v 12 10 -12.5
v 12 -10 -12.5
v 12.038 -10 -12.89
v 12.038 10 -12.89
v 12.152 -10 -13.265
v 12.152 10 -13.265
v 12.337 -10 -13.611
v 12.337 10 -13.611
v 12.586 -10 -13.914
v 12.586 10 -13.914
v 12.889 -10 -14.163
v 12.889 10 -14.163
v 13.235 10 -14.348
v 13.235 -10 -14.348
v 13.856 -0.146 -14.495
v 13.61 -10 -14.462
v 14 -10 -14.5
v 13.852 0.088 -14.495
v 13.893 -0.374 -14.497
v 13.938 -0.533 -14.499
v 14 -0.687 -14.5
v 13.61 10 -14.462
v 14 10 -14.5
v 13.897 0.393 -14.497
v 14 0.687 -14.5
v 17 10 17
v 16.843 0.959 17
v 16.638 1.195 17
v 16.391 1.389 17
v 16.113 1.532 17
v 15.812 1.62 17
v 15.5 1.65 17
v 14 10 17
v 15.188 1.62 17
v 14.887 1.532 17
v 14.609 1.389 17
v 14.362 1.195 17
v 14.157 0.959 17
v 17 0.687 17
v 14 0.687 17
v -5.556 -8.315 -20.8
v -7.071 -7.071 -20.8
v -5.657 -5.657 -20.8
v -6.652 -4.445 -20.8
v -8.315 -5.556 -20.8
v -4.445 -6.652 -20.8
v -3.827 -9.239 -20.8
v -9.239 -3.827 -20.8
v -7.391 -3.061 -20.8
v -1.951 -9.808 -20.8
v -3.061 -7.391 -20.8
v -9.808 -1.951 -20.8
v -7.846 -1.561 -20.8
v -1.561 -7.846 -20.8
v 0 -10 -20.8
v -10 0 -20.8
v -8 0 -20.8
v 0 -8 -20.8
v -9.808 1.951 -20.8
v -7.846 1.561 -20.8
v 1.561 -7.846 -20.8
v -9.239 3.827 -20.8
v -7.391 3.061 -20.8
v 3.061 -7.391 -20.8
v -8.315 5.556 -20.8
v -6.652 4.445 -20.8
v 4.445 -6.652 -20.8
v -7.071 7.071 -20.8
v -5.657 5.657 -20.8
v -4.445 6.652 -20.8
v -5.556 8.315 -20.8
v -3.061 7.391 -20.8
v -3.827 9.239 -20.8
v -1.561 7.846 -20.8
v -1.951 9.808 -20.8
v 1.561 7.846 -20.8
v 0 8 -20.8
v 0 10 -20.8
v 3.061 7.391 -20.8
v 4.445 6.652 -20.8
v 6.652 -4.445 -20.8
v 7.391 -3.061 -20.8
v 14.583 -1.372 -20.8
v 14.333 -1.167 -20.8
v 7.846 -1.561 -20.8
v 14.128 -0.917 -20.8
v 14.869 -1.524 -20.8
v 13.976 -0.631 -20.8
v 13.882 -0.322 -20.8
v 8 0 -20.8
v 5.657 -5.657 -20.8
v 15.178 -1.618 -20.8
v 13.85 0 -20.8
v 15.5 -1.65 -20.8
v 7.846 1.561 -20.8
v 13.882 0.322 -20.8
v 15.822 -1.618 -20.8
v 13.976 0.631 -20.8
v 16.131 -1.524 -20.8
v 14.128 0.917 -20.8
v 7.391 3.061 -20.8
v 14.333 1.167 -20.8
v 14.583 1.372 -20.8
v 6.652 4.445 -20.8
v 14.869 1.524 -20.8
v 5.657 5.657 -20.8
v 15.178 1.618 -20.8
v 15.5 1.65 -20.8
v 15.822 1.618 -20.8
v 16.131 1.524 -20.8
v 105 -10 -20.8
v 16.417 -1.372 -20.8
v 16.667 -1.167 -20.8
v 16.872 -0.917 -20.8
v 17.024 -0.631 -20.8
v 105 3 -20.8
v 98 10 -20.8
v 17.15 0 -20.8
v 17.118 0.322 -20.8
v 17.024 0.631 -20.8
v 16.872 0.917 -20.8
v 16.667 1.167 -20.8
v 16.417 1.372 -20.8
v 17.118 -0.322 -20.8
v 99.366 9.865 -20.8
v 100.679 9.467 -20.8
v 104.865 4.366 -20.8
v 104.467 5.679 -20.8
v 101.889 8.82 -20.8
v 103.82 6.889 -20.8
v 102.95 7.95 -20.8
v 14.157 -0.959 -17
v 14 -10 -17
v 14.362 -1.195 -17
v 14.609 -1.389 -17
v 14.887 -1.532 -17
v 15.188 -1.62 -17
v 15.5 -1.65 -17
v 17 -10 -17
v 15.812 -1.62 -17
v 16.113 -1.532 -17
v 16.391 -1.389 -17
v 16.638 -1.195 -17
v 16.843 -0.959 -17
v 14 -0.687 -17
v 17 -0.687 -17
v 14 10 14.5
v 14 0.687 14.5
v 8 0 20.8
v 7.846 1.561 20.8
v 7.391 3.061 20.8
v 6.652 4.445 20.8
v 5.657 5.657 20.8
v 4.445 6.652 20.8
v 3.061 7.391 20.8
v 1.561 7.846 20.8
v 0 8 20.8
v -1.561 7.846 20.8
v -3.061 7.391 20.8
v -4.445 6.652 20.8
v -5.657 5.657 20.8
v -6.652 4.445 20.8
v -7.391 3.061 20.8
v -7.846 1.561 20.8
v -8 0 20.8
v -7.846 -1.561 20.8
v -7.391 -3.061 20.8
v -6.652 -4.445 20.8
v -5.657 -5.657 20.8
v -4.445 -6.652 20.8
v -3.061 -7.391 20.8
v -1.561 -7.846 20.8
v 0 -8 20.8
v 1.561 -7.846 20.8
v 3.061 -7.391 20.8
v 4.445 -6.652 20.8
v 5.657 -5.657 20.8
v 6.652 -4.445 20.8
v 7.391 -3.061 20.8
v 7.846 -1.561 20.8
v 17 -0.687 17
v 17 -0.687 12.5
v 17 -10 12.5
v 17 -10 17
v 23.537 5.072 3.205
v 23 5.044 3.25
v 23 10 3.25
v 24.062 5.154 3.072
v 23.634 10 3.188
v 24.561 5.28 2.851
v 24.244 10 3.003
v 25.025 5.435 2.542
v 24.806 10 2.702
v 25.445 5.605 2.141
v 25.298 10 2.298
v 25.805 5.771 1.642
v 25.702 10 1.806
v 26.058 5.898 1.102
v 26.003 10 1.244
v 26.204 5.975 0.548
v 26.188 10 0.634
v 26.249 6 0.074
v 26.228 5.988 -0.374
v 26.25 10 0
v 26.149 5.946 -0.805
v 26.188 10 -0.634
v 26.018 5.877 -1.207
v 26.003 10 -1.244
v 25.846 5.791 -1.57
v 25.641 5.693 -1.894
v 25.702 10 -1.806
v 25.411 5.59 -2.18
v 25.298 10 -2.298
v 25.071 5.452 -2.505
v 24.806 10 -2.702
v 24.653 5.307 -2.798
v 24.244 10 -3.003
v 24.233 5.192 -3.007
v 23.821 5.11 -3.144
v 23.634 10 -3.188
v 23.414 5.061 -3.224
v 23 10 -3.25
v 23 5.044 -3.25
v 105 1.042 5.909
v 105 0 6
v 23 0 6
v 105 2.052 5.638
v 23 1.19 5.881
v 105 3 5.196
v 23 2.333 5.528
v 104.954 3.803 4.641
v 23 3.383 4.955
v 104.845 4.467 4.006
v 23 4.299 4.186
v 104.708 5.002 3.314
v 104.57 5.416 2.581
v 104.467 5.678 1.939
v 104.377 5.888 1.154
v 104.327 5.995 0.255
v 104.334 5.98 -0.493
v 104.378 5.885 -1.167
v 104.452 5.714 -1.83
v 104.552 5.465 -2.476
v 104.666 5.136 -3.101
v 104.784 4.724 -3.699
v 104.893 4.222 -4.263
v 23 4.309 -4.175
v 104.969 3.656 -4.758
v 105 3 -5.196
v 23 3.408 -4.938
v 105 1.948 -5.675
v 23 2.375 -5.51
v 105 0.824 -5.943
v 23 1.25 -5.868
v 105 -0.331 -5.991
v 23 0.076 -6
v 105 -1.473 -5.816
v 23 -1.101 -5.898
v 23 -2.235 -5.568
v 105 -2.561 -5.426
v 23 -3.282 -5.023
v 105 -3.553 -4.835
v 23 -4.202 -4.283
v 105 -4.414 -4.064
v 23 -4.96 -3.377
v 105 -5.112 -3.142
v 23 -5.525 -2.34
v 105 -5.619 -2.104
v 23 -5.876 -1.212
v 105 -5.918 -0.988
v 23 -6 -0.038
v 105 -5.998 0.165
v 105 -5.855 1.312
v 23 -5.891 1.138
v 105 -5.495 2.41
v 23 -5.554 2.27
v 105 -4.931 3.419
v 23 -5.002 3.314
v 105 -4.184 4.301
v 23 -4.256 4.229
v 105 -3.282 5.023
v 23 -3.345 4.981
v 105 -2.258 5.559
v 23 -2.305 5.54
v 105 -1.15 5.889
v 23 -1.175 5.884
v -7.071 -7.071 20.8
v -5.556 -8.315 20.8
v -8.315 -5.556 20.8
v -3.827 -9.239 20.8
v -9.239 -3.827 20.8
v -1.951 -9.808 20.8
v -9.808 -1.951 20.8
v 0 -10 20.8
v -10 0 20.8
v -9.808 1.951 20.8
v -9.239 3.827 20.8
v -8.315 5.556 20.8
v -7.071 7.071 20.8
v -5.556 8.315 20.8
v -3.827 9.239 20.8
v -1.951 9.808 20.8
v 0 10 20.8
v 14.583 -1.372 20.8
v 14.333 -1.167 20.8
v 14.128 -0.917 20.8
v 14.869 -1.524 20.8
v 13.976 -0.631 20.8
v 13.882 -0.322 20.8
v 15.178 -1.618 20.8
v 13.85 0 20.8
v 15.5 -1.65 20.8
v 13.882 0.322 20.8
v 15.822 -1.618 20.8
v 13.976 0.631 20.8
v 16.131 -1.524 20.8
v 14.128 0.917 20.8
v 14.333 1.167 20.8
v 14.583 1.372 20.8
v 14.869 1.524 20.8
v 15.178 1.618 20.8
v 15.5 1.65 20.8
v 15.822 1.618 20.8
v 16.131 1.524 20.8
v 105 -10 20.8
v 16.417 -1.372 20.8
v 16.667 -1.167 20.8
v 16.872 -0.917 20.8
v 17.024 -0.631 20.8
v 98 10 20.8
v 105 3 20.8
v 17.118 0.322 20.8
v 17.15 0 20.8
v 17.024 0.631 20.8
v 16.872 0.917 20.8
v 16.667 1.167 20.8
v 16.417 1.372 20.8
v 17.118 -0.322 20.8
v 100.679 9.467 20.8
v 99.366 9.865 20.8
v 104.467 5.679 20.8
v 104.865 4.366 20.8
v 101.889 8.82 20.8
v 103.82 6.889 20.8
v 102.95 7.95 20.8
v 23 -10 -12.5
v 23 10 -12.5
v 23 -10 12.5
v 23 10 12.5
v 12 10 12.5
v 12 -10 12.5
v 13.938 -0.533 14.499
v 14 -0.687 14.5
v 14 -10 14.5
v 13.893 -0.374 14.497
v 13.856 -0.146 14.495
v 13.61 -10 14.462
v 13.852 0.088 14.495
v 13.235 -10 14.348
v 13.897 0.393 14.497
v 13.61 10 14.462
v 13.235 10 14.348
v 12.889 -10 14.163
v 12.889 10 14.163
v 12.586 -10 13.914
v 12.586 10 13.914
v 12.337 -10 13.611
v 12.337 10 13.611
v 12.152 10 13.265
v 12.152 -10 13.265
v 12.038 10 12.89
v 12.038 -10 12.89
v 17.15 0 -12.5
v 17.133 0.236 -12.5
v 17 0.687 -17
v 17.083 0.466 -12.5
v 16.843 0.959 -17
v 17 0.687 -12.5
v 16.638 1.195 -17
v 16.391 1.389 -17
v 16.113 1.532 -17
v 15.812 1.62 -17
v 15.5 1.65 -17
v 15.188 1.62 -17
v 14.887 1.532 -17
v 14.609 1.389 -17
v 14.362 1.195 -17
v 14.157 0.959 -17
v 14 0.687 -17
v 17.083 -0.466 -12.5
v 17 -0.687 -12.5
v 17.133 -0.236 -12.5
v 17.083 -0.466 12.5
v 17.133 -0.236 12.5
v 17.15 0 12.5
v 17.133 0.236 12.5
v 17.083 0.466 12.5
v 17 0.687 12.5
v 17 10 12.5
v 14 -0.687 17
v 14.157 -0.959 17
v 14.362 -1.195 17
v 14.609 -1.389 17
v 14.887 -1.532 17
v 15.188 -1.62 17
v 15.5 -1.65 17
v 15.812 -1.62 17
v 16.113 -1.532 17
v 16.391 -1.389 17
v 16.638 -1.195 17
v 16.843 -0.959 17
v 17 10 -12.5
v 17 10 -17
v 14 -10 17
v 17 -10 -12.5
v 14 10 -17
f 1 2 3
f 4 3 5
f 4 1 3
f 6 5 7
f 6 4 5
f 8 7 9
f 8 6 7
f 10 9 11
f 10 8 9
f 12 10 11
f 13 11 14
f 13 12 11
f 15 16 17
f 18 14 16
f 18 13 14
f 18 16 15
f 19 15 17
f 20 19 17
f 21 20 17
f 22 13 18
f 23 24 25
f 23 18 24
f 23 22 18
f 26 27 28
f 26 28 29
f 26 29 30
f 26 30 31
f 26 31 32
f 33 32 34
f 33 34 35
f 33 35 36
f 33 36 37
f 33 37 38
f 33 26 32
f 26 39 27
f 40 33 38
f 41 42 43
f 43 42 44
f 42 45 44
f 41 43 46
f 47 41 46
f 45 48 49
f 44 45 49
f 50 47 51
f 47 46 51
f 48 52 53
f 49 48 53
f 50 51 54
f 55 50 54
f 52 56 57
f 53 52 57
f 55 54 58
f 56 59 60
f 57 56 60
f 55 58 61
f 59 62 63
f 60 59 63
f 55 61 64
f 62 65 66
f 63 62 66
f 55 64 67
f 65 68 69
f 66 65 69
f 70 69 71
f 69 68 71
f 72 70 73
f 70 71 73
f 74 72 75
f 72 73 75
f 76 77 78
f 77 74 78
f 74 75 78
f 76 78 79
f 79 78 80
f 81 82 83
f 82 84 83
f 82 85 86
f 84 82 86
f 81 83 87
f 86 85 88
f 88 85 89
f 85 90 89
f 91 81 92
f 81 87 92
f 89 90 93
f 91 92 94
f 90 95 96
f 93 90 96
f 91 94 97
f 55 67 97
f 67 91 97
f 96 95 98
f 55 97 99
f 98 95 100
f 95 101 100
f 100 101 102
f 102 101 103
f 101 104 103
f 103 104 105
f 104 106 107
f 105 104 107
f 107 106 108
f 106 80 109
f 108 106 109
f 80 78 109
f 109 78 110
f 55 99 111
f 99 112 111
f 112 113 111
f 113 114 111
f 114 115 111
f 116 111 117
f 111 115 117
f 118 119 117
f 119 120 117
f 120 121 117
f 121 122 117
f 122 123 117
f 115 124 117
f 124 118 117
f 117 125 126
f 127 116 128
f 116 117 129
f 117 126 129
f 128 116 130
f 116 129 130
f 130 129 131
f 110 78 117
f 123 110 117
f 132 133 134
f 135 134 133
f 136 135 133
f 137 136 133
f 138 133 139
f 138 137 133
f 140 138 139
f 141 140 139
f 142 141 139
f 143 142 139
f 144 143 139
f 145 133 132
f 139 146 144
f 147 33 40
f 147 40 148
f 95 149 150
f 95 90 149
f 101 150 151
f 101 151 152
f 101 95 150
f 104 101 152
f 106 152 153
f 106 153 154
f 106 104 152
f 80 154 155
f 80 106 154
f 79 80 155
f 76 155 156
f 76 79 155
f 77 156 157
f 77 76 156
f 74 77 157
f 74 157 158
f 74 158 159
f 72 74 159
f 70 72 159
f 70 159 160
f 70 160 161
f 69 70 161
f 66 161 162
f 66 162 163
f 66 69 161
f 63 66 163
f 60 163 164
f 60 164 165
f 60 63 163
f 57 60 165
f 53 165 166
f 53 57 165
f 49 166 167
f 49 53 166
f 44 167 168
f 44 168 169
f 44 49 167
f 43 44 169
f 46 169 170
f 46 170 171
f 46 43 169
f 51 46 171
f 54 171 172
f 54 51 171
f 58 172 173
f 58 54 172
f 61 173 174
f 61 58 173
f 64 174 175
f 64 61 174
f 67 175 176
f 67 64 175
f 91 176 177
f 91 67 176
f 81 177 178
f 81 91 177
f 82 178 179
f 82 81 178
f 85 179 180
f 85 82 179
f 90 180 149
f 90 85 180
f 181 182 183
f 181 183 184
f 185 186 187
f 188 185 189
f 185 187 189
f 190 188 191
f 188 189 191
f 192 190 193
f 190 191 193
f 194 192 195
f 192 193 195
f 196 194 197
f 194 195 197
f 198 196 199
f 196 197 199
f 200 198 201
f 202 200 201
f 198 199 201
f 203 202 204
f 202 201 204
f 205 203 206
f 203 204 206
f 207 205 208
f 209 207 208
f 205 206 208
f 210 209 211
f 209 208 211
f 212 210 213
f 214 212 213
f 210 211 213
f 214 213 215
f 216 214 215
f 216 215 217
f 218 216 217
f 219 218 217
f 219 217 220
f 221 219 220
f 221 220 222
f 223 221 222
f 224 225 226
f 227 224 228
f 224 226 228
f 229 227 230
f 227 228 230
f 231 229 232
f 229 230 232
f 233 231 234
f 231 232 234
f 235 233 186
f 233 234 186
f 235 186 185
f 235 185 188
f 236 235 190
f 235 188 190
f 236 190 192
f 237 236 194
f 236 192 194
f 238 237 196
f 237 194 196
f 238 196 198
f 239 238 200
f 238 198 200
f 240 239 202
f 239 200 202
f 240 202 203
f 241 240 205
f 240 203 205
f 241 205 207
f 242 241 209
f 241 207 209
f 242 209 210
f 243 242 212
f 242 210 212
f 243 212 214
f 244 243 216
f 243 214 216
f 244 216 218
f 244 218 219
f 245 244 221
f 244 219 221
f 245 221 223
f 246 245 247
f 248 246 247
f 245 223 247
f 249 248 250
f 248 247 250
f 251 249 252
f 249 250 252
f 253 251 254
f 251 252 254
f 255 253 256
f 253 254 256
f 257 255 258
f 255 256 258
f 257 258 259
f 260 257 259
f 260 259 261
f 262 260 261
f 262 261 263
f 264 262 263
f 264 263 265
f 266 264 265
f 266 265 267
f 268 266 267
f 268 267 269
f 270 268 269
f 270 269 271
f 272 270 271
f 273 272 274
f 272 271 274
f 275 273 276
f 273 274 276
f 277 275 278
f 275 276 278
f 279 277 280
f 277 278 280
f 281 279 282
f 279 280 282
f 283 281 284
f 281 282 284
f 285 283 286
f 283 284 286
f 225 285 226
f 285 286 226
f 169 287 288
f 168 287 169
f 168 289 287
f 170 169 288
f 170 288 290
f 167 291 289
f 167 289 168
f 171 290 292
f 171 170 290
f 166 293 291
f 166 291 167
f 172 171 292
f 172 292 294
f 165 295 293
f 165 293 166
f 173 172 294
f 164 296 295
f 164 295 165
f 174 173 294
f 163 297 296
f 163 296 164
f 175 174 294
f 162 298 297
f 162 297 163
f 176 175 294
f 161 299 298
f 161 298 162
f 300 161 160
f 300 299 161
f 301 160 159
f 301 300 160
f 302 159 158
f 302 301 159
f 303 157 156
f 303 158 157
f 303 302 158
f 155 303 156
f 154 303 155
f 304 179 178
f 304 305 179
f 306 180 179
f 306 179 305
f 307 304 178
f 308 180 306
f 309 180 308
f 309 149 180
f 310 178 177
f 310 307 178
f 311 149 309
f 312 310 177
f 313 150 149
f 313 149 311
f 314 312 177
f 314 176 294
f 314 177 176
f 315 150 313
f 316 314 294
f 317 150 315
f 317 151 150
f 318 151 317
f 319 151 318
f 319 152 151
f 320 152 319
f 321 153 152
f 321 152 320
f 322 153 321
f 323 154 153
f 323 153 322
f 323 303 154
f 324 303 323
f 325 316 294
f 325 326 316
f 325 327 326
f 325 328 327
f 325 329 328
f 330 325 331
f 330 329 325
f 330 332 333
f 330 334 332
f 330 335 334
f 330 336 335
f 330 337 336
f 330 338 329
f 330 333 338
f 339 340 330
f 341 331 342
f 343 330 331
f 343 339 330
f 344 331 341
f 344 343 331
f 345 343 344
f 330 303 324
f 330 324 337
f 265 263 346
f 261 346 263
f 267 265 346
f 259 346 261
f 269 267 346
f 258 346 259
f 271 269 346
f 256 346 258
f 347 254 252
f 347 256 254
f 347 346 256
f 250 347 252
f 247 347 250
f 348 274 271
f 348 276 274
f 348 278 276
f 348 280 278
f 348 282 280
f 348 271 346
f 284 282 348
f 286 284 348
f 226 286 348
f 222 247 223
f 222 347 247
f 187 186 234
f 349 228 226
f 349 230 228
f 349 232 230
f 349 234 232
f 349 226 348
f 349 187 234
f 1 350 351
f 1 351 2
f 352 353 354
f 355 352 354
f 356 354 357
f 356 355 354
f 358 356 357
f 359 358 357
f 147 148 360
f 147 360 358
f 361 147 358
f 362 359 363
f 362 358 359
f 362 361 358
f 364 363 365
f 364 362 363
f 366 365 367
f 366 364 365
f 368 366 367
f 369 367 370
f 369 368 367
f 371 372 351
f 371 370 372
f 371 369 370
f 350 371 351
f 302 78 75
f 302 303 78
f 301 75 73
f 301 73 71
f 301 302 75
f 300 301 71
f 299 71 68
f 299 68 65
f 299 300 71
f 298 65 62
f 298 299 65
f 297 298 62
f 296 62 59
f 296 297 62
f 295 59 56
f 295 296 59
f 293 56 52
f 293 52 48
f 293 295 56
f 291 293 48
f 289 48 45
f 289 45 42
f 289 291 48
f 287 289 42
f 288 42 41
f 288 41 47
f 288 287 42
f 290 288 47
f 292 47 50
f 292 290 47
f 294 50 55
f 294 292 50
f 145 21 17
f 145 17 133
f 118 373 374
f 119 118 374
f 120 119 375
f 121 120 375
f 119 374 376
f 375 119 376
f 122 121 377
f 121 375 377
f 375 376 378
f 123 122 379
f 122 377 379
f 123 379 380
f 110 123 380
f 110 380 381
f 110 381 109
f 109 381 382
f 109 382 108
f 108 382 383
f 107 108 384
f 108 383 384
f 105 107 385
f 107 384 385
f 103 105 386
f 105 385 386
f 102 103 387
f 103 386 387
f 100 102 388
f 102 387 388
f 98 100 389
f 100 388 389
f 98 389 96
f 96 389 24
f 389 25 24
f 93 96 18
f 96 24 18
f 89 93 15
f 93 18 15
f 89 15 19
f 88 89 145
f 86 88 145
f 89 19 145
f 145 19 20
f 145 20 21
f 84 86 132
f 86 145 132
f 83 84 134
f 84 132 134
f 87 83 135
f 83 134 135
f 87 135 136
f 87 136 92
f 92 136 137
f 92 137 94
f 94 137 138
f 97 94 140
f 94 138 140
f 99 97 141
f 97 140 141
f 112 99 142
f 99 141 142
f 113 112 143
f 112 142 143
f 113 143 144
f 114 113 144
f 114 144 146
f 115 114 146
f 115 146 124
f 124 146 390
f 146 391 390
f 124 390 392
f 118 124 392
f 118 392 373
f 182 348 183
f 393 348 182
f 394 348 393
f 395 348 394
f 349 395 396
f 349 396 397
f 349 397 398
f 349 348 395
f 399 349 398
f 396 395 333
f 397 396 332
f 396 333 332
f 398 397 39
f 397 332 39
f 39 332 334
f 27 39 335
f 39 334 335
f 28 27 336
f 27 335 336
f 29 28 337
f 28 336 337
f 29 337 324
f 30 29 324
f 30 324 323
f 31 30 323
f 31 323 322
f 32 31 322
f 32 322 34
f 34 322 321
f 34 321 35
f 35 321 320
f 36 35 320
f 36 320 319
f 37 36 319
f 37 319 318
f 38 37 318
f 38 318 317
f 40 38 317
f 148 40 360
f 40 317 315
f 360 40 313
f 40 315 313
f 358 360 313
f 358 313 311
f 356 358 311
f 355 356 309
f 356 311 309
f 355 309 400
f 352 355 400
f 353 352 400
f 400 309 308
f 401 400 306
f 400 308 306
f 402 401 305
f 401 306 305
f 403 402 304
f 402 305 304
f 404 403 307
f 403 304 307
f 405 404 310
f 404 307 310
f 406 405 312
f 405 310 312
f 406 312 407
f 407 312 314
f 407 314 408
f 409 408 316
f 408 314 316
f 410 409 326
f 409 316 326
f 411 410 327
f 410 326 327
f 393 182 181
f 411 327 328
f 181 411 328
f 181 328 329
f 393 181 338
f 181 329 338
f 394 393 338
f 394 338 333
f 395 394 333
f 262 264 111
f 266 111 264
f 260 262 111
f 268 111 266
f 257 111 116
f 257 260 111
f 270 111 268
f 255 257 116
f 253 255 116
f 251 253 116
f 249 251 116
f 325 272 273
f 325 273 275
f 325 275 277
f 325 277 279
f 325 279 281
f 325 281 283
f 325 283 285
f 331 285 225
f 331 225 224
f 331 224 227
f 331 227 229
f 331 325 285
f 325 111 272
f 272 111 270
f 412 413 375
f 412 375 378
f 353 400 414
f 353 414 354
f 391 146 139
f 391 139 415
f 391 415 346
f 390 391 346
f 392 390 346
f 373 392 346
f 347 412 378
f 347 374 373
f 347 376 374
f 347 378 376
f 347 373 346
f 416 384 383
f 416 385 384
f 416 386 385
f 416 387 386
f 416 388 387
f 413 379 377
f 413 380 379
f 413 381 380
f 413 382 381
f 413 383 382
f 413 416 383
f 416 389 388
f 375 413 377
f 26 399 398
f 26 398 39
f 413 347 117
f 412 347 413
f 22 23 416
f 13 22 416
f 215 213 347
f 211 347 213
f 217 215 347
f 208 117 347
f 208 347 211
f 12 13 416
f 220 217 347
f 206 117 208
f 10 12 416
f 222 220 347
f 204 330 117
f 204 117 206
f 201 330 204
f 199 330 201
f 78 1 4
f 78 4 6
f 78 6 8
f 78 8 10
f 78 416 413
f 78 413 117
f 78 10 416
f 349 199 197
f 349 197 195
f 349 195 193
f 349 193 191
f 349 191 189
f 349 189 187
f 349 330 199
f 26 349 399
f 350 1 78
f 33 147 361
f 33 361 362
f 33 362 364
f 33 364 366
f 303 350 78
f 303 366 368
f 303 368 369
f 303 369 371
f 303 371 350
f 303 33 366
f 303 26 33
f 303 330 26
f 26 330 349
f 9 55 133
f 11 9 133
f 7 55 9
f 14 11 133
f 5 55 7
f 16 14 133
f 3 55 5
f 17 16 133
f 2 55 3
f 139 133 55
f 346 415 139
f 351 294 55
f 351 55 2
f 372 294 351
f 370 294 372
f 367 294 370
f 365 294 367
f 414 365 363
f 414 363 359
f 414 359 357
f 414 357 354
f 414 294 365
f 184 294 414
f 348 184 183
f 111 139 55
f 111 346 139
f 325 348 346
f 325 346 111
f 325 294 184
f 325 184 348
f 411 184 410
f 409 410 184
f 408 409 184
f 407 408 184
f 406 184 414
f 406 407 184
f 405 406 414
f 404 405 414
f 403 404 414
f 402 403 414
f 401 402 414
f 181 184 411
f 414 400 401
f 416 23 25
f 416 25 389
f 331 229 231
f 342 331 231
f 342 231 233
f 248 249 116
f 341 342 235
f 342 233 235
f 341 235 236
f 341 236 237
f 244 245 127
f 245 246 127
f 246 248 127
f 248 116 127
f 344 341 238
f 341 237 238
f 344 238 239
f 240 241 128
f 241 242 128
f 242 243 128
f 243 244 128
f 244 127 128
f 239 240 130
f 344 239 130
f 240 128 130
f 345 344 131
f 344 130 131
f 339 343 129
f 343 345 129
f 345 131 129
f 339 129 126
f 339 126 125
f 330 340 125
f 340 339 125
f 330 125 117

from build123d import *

# Parameters (mm, degrees)
ESQUISSE1_R                         = 8
BOSS_EXTRU_1_DEPTH                  = 20.8
DIAM_TRE_DU_PER_AGE_12_0_12_1_D     = 12
DIAM_TRE_DU_PER_AGE_12_0_12_1_DEPTH = 88
DIAM_TRE_DU_PER_AGE_12_0_12_1_TIP   = 3.605163714
CONG_1_R                            = 7
ENL_V_MAT_EXTRU_1_DEPTH             = 109.892791429
ESQUISSE6_R                         = 3.25
ENL_V_MAT_EXTRU_2_DEPTH             = 10
TROU_TARAUD_M41_D                   = 3.3


with BuildPart() as part:
    # Esquisse1 → Boss.-Extru.1 (new, symmetric)
    with BuildSketch(Plane.XY):
        with BuildLine():
            Line((0, -10), (105, -10))
            Line((105, -10), (105, 10))
            Line((105, 10), (0, 10))
            ThreePointArc((0, 10), (-10, 0), (0, -10))
        make_face()
        Circle(ESQUISSE1_R, mode=Mode.SUBTRACT)
    extrude(amount=BOSS_EXTRU_1_DEPTH, both=True)

    # Diamètre du perçage Ø12.0 (12)1
    with Locations(Plane(origin=(105, 0, 0), x_dir=(0, 0, -1), z_dir=(1, 0, 0))):
        with Locations((0, 0)):
            Hole(DIAM_TRE_DU_PER_AGE_12_0_12_1_D / 2, depth=DIAM_TRE_DU_PER_AGE_12_0_12_1_DEPTH)
            with Locations((0, 0, -(DIAM_TRE_DU_PER_AGE_12_0_12_1_DEPTH + DIAM_TRE_DU_PER_AGE_12_0_12_1_TIP / 2))):  # 118° drill point
                Cone(0, DIAM_TRE_DU_PER_AGE_12_0_12_1_D / 2, DIAM_TRE_DU_PER_AGE_12_0_12_1_TIP, mode=Mode.SUBTRACT)

    # Congé1
    # the kernel refuses this fillet: 7 mm, written as the material it takes off along each edge
    with BuildSketch(Plane(origin=(105, 10, -38.3), x_dir=(0, -1, 0), z_dir=(0, 0, 1))) as cong_1_piece_1:
        with BuildLine():
            CenterArc((CONG_1_R, -CONG_1_R), CONG_1_R, 90, 90)
            Line((0, -CONG_1_R), (0, 0))
            Line((0, 0), (CONG_1_R, 0))
        make_face()
    extrude(amount=76.6, mode=Mode.SUBTRACT)

    # Esquisse5 → Enlèv. mat.-Extru.1 (cut, through all)
    with BuildSketch(Plane(origin=(0, 10, 0), x_dir=(1, 0, 0), z_dir=(0, 1, 0))):
        with BuildLine():
            Line((12, -12.5), (12, 12.5))
            ThreePointArc((12, 12.5), (12.585786438, 13.914213562), (14, 14.5))
            Line((14, 14.5), (14, 17))
            Line((14, 17), (17, 17))
            Line((17, 17), (17, 12.5))
            Line((17, 12.5), (23, 12.5))
            Line((23, 12.5), (23, -12.5))
            Line((23, -12.5), (17, -12.5))
            Line((17, -12.5), (17, -17))
            Line((17, -17), (14, -17))
            Line((14, -17), (14, -14.5))
            ThreePointArc((14, -14.5), (12.585786438, -13.914213562), (12, -12.5))
        make_face()
    extrude(amount=-ENL_V_MAT_EXTRU_1_DEPTH, mode=Mode.SUBTRACT)

    # Esquisse6 → Enlèv. mat.-Extru.2 (cut)
    with BuildSketch(Plane(origin=(0, 10, 0), x_dir=(1, 0, 0), z_dir=(0, 1, 0))):
        with Locations((23, 0)):
            Circle(ESQUISSE6_R)
    extrude(amount=-ENL_V_MAT_EXTRU_2_DEPTH, mode=Mode.SUBTRACT)

    # Trou taraudé M41 (through all)
    with Locations(Plane(origin=(0, 0, -20.8), x_dir=(-1, 0, 0), z_dir=(0, 0, -1))):
        with Locations((-15.5, 0)):
            Hole(TROU_TARAUD_M41_D / 2)


solid = part.part
